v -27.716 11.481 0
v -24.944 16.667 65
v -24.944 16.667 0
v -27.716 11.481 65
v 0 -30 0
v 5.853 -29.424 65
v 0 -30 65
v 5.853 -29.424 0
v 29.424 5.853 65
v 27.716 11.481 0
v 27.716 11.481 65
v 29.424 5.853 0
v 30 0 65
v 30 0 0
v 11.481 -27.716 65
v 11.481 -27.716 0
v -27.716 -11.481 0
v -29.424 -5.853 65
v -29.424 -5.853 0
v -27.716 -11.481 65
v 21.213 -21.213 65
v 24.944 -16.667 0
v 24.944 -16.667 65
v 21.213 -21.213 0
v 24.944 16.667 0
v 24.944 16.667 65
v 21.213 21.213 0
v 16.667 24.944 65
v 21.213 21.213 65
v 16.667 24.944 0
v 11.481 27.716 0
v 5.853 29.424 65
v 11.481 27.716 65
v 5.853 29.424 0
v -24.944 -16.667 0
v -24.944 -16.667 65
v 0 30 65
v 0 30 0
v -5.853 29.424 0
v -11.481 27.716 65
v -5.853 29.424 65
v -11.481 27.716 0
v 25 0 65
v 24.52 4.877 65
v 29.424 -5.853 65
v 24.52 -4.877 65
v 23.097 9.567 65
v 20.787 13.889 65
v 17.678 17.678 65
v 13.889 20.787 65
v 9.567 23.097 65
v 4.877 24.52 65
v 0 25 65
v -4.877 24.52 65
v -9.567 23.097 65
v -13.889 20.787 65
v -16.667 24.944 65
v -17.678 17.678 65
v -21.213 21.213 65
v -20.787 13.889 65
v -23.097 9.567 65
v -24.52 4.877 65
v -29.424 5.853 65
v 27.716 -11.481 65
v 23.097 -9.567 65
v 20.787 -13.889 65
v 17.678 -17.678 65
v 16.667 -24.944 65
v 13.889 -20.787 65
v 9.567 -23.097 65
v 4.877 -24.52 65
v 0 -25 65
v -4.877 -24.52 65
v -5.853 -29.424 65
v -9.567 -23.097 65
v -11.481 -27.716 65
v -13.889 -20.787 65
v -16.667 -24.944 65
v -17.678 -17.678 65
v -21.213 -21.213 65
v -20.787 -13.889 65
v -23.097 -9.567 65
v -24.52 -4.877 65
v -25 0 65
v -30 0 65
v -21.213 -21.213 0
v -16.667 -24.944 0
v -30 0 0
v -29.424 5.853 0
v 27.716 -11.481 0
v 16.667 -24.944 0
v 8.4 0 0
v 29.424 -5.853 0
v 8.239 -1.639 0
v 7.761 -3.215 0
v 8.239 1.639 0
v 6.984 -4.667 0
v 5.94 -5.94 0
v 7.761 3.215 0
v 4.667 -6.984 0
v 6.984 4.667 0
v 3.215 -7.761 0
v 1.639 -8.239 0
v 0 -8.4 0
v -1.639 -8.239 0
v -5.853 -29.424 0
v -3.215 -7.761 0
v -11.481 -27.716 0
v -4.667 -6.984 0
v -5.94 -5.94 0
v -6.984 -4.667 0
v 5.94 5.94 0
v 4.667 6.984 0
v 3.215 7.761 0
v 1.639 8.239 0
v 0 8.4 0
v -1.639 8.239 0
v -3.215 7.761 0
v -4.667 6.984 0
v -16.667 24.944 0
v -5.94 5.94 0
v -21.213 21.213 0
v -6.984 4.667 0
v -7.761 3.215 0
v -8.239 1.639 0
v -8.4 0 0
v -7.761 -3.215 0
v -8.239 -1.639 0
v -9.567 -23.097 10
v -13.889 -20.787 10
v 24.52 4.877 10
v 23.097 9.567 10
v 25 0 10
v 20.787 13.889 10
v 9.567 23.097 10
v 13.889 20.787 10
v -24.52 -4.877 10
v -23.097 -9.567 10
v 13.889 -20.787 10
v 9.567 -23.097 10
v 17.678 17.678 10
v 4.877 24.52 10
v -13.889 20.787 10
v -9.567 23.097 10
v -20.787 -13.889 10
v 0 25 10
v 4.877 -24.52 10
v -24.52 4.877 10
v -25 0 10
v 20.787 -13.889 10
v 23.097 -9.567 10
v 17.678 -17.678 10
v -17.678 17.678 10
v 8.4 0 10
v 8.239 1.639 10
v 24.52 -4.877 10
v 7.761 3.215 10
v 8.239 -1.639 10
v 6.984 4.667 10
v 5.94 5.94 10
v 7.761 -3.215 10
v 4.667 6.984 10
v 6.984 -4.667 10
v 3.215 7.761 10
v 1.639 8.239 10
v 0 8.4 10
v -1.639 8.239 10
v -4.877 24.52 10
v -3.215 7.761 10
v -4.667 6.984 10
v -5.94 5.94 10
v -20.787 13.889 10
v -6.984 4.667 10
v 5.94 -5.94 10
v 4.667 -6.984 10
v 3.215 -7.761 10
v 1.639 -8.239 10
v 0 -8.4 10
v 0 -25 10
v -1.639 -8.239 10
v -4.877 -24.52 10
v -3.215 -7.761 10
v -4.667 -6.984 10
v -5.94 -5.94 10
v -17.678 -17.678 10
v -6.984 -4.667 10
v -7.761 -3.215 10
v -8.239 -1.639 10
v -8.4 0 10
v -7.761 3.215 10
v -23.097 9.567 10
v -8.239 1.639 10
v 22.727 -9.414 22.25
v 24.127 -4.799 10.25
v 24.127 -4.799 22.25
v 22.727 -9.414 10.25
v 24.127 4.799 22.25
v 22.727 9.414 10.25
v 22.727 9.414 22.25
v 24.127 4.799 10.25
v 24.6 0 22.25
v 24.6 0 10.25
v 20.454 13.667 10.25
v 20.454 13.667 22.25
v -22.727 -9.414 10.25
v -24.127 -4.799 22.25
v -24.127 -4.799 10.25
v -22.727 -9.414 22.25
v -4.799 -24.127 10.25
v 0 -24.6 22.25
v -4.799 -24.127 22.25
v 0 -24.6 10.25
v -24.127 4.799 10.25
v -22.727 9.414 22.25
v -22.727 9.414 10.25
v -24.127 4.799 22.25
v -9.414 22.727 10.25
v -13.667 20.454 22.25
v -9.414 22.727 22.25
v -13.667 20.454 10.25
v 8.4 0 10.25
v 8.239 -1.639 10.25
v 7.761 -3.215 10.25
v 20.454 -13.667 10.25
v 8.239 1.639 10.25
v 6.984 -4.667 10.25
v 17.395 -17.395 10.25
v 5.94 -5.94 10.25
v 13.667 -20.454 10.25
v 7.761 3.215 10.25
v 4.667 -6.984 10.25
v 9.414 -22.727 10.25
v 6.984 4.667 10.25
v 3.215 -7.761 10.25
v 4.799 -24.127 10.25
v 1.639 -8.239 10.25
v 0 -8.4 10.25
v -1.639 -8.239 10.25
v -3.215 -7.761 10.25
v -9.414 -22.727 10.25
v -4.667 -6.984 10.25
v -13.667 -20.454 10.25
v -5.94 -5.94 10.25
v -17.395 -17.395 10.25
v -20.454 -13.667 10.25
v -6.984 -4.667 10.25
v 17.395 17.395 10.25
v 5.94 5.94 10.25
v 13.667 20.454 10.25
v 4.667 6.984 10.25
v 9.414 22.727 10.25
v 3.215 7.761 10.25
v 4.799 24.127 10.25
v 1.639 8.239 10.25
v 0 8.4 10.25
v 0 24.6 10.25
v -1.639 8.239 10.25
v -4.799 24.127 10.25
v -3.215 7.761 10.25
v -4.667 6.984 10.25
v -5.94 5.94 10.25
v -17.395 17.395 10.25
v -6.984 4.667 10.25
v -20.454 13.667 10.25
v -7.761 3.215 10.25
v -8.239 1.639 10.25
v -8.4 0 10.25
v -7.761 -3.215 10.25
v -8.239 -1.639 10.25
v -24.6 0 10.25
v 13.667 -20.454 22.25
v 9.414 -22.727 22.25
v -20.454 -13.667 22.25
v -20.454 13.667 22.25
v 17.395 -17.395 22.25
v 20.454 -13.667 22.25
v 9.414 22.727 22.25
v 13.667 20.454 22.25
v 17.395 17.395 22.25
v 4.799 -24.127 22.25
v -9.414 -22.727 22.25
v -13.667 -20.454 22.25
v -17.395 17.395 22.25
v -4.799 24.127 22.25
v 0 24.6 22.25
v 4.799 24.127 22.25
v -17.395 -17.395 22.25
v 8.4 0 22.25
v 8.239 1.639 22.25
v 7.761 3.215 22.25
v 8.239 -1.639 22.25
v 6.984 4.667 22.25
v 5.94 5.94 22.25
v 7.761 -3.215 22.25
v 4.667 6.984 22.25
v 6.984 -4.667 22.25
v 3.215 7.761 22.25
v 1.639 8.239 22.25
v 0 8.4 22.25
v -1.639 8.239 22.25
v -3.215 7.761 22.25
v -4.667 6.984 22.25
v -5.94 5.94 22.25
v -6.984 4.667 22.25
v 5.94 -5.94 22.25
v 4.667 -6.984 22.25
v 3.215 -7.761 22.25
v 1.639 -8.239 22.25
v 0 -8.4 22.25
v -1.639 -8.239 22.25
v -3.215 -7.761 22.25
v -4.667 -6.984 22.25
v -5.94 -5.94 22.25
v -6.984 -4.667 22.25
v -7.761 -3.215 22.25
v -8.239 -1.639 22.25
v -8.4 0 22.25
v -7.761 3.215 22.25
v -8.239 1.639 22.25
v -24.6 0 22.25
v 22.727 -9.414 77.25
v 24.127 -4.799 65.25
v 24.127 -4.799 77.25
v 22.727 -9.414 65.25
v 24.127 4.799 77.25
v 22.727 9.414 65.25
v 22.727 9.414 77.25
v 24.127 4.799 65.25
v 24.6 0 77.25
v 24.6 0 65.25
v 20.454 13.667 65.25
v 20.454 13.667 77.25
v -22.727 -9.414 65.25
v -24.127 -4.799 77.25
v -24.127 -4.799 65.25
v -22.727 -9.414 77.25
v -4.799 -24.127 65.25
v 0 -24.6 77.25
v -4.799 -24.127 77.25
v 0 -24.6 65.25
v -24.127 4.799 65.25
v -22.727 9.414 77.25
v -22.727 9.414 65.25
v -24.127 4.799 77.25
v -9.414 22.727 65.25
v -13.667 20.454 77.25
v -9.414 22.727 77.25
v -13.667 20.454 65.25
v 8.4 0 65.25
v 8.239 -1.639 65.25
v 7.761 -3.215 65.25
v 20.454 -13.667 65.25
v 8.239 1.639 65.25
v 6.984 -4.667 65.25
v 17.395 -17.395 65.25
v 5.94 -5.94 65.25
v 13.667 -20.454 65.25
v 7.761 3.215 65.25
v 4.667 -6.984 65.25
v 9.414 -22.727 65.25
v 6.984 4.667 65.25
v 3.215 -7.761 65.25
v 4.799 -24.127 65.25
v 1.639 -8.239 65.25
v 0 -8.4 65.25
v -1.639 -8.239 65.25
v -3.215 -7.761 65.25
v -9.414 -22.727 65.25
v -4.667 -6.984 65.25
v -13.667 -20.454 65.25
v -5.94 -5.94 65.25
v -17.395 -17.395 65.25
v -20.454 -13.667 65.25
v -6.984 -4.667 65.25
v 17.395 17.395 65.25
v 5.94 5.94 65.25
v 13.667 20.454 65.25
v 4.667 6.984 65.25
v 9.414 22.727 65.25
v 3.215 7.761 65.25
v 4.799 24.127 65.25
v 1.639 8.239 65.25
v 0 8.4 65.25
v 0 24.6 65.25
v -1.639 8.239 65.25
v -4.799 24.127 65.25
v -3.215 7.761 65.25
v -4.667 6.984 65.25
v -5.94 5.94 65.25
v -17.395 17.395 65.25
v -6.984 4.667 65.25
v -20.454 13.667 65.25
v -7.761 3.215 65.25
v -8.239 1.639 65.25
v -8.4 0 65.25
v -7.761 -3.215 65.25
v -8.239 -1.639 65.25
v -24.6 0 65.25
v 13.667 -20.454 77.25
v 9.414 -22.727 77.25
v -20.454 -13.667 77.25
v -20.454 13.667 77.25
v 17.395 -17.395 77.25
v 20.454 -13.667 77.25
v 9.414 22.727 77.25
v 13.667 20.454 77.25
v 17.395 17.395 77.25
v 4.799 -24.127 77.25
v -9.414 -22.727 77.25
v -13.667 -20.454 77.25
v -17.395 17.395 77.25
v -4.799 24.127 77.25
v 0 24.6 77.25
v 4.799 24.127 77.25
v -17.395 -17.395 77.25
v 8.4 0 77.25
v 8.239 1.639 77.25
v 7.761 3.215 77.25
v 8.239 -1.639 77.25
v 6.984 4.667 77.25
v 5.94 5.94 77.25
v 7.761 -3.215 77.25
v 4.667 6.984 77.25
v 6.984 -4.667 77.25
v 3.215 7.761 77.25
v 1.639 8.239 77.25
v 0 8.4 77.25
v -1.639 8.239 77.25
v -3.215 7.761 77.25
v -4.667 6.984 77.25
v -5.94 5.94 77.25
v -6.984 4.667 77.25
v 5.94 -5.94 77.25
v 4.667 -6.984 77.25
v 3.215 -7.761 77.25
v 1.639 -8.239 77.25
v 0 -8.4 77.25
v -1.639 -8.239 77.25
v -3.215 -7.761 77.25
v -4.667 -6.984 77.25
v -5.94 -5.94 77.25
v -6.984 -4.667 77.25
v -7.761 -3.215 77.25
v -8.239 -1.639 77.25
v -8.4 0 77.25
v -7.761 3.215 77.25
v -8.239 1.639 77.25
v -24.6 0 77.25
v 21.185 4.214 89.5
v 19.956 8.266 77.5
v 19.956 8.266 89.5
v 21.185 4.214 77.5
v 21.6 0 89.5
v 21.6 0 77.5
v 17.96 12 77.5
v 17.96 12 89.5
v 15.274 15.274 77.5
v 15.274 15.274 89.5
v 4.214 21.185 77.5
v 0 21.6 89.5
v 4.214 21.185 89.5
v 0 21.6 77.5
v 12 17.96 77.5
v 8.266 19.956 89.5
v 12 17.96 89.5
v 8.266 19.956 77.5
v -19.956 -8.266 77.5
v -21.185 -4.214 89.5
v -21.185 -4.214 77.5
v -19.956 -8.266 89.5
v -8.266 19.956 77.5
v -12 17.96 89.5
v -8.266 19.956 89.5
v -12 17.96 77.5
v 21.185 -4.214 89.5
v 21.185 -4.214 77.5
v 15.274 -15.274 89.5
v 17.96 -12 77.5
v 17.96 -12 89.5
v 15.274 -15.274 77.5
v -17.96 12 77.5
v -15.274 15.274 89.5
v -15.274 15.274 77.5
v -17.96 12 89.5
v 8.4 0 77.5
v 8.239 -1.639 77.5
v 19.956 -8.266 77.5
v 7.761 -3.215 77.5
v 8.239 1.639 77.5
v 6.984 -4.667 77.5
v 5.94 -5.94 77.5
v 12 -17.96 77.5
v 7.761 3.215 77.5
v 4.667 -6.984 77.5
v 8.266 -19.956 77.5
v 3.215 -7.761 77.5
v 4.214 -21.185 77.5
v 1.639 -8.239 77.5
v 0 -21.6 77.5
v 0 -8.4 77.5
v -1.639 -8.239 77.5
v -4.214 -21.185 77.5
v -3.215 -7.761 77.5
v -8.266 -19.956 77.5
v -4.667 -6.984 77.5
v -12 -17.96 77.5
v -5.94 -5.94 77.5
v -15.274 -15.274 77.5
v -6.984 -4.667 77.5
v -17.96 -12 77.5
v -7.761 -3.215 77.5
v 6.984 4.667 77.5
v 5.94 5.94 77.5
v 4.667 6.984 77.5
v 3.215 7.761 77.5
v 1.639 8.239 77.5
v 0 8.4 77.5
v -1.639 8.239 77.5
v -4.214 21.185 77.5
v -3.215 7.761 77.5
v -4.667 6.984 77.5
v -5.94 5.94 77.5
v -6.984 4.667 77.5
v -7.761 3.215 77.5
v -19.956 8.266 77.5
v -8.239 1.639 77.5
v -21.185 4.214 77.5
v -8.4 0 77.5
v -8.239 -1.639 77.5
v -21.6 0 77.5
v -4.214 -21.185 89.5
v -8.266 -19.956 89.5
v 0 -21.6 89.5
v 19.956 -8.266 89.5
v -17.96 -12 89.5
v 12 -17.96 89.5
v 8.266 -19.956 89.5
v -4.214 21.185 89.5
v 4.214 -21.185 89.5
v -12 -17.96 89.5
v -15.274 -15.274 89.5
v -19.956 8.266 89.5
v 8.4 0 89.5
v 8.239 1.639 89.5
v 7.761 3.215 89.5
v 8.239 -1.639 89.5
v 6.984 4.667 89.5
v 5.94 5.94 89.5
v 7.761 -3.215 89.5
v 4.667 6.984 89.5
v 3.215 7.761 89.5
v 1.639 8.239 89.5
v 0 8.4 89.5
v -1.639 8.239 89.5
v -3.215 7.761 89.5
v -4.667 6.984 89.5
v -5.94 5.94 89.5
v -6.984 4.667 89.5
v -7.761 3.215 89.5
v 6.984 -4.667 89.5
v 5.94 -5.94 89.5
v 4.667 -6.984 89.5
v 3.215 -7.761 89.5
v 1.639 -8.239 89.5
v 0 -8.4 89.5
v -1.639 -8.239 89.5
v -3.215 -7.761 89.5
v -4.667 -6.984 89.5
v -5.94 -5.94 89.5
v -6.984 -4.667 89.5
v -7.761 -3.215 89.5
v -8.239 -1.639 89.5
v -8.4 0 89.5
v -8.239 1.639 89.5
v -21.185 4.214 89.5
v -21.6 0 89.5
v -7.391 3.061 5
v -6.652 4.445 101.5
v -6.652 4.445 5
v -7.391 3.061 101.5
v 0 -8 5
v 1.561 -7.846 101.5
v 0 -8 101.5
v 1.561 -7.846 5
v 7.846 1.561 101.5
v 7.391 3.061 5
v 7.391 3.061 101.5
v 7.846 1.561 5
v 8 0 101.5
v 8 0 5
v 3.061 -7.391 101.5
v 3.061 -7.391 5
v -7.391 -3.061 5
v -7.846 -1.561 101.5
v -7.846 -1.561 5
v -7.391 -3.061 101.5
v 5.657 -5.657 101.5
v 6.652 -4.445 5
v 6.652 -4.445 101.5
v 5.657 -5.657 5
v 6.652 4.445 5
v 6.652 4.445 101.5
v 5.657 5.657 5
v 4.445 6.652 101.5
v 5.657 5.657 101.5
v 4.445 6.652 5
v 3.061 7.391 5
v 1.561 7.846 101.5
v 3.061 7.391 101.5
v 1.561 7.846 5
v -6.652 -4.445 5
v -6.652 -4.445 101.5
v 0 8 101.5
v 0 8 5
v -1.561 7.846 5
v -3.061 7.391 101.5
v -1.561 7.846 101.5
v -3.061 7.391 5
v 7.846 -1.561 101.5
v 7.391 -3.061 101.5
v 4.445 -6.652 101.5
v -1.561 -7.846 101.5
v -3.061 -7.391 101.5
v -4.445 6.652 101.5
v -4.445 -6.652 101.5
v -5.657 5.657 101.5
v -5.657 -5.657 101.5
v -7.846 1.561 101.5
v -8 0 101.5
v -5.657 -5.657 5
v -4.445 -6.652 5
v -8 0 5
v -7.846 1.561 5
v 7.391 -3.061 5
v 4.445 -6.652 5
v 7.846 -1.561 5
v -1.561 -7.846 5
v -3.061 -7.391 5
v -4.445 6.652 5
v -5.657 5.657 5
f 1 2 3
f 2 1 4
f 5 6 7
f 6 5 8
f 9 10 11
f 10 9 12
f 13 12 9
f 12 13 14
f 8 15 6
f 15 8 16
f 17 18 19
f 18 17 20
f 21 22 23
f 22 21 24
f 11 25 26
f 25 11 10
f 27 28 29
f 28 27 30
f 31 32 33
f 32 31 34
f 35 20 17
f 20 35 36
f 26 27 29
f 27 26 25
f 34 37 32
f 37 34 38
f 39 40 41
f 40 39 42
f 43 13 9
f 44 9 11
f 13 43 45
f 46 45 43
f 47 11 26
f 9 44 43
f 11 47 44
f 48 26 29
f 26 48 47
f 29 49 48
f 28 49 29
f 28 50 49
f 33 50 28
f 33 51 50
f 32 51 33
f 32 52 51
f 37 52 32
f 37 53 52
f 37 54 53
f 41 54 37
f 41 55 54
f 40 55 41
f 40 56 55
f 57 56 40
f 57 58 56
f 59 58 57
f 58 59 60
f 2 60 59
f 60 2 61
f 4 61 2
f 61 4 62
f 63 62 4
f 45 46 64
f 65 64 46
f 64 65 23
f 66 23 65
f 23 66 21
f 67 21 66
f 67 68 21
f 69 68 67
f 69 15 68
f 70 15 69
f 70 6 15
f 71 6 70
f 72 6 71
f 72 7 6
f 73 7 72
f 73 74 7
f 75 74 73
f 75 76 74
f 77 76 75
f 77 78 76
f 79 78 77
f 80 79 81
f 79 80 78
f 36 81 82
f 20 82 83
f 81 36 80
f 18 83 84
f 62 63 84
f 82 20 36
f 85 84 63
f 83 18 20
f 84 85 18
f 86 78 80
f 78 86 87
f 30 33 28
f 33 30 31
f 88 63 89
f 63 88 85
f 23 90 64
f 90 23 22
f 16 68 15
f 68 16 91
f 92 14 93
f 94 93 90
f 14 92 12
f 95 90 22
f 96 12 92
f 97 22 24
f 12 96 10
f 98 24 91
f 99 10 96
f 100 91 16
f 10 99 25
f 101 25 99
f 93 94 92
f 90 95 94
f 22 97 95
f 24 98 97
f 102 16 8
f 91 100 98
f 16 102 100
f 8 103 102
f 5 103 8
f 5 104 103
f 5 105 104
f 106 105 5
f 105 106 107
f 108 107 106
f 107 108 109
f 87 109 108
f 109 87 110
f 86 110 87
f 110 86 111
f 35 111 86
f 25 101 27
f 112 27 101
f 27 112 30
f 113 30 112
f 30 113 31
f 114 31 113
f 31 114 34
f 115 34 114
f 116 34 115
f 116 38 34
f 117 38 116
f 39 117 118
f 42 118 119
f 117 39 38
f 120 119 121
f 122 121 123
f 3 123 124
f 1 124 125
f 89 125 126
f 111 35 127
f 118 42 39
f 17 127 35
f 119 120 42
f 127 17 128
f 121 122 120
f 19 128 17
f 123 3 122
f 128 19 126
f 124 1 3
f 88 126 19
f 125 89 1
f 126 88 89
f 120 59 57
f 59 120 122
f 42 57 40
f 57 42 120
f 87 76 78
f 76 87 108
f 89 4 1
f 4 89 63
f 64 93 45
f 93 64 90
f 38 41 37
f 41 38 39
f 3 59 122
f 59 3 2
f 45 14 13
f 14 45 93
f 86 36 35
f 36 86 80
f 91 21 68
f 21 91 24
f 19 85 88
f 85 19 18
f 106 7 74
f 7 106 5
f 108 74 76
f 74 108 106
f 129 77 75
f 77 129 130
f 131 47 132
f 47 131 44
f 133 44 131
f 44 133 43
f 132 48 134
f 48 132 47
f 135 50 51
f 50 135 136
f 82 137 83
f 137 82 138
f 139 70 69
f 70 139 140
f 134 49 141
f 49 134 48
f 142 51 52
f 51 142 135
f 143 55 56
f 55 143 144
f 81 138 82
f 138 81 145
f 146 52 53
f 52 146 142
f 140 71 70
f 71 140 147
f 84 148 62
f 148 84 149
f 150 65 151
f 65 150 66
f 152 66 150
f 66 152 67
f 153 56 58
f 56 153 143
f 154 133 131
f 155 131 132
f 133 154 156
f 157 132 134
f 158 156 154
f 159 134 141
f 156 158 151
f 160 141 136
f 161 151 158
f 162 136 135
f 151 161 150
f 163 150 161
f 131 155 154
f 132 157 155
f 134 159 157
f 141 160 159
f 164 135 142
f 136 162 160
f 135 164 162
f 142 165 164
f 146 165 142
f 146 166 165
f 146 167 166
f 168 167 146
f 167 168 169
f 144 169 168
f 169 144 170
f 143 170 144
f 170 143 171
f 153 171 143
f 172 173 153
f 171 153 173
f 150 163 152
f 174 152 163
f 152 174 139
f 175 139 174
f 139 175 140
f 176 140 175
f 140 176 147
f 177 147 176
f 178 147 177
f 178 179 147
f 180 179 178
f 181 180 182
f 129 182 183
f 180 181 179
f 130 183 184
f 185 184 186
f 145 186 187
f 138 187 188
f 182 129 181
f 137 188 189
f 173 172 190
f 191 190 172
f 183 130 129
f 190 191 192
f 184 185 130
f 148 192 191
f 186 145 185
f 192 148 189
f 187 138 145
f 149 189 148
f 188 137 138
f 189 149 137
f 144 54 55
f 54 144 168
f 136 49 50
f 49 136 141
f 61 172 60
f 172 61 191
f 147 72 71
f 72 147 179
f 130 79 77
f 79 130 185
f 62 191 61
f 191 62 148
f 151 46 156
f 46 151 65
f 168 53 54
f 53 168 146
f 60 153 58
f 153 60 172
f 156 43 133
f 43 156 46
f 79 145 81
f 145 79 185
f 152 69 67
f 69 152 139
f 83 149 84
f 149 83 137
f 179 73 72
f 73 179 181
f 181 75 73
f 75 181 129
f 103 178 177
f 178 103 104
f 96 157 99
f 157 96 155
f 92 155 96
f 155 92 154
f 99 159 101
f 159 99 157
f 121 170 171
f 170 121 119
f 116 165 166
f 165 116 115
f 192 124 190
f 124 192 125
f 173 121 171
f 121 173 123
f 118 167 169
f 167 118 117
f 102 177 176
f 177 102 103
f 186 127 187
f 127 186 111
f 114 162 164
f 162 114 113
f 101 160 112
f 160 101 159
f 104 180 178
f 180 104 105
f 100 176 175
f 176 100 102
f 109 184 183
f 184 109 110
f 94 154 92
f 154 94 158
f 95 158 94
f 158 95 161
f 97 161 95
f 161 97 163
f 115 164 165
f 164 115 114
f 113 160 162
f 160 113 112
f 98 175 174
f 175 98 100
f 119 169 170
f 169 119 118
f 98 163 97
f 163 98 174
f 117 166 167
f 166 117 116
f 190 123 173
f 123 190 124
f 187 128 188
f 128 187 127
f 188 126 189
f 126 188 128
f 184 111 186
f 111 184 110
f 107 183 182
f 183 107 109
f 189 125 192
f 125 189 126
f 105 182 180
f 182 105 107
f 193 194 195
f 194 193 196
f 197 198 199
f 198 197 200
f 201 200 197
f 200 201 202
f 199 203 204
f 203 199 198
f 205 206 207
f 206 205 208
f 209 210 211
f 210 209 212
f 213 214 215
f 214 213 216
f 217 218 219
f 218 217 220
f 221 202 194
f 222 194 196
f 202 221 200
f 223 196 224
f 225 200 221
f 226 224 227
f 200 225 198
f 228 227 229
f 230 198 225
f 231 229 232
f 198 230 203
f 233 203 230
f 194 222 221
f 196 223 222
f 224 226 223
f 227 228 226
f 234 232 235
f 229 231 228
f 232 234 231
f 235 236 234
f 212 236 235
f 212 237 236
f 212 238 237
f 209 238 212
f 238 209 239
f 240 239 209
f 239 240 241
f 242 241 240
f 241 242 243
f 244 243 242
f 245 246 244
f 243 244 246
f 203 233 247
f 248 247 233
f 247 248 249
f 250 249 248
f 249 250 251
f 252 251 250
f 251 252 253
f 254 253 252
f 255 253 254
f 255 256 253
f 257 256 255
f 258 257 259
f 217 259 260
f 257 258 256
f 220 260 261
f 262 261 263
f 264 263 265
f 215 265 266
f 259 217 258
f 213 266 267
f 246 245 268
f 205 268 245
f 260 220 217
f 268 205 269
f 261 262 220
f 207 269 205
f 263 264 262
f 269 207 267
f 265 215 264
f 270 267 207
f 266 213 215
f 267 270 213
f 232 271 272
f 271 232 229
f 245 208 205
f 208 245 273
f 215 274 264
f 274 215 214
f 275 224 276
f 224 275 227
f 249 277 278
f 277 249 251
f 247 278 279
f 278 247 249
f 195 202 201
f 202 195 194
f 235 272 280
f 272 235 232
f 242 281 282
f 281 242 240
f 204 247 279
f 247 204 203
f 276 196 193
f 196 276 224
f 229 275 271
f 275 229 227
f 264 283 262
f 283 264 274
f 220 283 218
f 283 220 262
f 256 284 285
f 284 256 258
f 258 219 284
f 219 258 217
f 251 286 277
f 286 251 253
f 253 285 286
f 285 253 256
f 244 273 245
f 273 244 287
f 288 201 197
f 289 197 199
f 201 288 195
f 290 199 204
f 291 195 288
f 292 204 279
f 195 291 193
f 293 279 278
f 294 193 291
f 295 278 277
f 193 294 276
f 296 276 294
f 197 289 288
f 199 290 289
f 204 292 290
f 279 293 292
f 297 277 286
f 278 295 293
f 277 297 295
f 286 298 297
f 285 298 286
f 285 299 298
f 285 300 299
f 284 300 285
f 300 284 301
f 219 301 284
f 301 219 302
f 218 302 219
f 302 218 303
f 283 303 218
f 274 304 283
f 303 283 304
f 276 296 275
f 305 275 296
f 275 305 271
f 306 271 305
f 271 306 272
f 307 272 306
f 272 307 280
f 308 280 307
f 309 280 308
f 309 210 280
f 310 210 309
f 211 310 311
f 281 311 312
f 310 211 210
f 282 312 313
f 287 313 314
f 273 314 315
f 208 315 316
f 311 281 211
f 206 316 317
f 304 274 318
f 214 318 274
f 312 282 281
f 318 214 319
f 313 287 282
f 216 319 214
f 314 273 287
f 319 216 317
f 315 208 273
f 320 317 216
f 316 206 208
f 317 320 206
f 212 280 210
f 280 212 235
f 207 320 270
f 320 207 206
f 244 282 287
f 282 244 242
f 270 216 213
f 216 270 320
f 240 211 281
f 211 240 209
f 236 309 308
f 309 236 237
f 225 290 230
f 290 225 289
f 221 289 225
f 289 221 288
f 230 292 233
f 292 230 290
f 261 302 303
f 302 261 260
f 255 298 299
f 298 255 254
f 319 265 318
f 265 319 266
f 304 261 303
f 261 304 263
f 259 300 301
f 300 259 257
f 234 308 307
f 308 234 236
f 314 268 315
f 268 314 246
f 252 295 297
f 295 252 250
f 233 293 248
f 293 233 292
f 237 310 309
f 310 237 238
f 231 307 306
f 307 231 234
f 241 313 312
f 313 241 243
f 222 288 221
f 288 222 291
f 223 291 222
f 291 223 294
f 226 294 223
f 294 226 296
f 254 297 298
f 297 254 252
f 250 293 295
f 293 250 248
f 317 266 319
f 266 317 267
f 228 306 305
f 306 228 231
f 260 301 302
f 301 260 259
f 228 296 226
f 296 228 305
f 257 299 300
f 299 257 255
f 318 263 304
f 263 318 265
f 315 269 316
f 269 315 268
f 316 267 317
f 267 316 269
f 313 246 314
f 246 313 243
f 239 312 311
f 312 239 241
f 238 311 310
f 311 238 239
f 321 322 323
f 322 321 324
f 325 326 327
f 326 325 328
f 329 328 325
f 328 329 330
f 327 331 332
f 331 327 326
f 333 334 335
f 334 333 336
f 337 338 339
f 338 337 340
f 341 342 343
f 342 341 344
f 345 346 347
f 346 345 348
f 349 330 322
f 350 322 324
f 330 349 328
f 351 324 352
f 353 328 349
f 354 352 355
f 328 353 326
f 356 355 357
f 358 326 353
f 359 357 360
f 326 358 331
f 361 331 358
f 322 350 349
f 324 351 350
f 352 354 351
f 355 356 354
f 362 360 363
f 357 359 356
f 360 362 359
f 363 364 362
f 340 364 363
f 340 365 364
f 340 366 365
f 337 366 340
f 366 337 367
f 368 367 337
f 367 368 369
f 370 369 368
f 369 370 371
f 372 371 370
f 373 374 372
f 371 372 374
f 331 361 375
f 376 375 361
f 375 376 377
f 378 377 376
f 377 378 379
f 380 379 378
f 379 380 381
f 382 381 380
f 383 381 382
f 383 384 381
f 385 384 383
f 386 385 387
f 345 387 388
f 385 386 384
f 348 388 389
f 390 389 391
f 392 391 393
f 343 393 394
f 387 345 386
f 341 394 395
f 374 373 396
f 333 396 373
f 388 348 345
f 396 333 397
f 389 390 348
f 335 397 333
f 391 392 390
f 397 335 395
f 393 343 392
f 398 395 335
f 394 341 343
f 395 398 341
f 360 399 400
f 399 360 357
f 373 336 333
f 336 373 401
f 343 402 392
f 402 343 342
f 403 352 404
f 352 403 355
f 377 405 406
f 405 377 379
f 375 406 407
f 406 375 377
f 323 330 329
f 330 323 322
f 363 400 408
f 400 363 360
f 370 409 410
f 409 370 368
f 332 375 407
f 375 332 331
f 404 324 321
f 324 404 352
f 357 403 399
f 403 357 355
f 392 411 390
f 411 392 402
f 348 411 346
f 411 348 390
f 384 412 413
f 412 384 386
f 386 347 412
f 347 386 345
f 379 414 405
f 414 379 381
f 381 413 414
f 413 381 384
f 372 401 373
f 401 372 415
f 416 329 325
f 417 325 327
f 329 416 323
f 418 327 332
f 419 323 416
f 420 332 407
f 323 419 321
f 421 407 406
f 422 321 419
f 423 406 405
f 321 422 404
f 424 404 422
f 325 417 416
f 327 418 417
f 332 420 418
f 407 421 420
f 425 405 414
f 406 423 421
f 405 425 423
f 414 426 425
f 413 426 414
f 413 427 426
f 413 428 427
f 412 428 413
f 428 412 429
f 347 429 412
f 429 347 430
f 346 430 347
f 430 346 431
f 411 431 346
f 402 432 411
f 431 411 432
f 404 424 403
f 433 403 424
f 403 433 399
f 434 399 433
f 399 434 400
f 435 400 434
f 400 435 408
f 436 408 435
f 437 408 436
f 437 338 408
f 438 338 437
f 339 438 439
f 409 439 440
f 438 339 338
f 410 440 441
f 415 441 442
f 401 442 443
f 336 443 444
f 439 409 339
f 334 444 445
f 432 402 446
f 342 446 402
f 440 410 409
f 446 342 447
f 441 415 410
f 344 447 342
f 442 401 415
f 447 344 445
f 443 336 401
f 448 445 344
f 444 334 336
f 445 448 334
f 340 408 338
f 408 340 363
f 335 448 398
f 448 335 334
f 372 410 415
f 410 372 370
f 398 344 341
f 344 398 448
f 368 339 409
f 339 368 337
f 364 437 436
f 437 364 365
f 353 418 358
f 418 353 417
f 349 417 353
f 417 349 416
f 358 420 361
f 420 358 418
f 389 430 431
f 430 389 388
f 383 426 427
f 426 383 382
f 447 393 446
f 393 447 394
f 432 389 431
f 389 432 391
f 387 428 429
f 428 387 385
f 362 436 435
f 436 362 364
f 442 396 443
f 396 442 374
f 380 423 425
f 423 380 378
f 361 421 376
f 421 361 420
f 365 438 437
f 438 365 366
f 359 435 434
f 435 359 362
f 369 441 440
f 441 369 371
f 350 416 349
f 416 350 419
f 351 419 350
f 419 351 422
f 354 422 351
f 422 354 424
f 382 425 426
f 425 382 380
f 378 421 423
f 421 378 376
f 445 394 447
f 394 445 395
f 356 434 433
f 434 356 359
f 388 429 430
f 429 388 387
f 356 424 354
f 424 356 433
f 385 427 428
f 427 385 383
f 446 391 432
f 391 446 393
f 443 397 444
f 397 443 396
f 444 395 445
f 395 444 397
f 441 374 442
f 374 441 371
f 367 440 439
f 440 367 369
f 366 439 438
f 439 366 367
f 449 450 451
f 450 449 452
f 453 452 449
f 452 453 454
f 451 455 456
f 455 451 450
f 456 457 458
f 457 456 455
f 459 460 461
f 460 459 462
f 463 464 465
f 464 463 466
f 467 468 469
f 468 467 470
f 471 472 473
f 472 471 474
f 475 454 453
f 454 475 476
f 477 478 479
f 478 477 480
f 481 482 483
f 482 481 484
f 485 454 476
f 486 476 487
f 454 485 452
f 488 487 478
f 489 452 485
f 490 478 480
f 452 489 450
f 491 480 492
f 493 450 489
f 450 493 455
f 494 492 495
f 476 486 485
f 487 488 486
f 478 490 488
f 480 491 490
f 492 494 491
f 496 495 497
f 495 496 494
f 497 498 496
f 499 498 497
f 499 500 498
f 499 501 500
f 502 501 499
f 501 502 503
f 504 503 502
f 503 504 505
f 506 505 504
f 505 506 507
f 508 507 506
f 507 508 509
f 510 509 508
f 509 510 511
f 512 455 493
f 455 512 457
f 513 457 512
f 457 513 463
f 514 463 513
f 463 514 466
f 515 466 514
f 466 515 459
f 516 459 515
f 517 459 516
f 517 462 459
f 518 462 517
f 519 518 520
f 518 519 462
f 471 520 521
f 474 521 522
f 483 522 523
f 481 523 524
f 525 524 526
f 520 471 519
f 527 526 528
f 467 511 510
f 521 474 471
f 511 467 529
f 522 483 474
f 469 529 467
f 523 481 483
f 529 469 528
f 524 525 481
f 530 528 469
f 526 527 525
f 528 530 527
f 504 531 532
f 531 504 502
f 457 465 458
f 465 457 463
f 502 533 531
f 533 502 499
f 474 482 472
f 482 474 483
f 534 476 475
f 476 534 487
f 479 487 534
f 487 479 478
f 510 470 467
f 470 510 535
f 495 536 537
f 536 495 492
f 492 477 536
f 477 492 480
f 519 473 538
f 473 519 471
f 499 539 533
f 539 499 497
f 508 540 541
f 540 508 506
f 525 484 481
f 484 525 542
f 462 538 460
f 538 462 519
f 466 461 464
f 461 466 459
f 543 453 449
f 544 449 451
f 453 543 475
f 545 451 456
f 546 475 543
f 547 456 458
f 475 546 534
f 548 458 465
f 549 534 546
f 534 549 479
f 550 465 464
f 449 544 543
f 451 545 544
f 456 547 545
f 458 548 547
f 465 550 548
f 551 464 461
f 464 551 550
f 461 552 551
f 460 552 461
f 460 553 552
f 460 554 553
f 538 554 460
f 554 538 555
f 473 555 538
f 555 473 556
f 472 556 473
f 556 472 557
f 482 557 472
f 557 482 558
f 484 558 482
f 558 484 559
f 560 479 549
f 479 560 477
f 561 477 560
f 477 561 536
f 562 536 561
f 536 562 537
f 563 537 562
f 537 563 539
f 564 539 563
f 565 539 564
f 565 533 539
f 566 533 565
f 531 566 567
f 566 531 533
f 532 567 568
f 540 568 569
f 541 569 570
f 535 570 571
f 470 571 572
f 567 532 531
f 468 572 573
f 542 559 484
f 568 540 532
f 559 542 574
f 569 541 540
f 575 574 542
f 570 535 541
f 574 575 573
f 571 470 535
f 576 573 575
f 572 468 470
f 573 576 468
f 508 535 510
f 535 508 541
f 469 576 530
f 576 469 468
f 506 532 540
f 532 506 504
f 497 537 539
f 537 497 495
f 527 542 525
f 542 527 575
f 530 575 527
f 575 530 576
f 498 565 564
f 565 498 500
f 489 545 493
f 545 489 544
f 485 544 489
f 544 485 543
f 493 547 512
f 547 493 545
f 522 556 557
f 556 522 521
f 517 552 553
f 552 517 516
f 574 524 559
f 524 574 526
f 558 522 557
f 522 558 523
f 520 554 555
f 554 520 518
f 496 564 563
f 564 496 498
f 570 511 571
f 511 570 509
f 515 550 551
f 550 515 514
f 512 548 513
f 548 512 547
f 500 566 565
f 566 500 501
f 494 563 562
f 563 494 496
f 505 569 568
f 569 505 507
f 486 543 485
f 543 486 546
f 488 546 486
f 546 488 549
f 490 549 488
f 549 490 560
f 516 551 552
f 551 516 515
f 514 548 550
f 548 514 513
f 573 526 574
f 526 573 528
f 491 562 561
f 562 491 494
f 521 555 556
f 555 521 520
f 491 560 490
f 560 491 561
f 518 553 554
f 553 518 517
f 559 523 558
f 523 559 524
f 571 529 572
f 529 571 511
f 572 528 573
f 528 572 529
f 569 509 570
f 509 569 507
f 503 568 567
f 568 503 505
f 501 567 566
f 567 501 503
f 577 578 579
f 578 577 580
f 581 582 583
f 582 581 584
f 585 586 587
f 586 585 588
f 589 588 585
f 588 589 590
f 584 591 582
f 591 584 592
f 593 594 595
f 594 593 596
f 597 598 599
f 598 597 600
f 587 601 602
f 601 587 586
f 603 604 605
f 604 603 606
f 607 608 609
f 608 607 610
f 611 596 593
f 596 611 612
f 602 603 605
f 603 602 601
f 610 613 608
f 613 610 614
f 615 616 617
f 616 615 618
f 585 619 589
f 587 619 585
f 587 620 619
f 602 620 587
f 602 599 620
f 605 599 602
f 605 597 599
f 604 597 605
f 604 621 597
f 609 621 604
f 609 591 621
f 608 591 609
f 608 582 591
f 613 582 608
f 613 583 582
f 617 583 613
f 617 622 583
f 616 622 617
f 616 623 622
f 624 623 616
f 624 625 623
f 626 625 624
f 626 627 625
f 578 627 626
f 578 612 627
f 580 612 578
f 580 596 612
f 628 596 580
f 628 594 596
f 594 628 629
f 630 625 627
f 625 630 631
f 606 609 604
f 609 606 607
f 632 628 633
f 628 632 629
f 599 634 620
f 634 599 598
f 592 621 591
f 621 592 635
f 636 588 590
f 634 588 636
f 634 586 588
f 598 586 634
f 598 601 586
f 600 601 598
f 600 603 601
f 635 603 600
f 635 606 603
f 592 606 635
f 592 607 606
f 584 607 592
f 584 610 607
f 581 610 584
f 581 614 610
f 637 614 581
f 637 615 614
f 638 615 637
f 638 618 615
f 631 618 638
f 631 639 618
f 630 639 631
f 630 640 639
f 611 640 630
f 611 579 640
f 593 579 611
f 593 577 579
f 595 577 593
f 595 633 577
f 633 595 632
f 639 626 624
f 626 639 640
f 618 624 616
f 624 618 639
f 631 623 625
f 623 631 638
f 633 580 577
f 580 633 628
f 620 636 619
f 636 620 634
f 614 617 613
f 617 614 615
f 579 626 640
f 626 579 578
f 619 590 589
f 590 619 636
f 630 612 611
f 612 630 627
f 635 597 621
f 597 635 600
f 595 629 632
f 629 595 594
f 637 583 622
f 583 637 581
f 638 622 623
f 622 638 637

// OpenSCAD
$fn = 32;

// ------------------------------------------------------------------------
// Bearing housing: housing d60, two bearings and a shaft
// Every part is its own module, assembly() places them once.
// ------------------------------------------------------------------------

// --- part 1 ---
module housing() {
  difference() {
    cylinder(h = 65, d = 60);
    translate([0, 0, 10]) cylinder(h = 56, d = 50);
    translate([0, 0, -1]) cylinder(h = 12, d = 16.8);
  }
}

// --- part 2 ---
module bearing_lower() {
  difference() {
      translate([0, 0, 0]) cylinder(h = 12, d = 49.2);
      translate([0, 0, -1]) cylinder(h = 14, d = 16.8);
    }
}

// --- part 3 ---
module bearing_upper() {
  difference() {
      translate([0, 0, 0]) cylinder(h = 12, d = 49.2);
      translate([0, 0, -1]) cylinder(h = 14, d = 16.8);
    }
}

// --- part 4 ---
module spacer() {
  difference() {
      translate([0, 0, 0]) cylinder(h = 12, d = 43.2);
      translate([0, 0, -1]) cylinder(h = 14, d = 16.8);
    }
}

// --- part 5 ---
module shaft() {
  translate([0, 0, -48.25]) cylinder(h = 96.5, d = 16);
}

// --- assembly ---
module assembly() {
  translate([0, 0, 0]) rotate([0, 0, 0]) housing();
  translate([0, 0, 10.25]) rotate([0, 0, 0]) bearing_lower();
  translate([0, 0, 65.25]) rotate([0, 0, 0]) bearing_upper();
  translate([0, 0, 77.5]) rotate([0, 0, 0]) spacer();
  translate([0, 0, 53.25]) rotate([0, 0, 0]) shaft();
}

assembly();
